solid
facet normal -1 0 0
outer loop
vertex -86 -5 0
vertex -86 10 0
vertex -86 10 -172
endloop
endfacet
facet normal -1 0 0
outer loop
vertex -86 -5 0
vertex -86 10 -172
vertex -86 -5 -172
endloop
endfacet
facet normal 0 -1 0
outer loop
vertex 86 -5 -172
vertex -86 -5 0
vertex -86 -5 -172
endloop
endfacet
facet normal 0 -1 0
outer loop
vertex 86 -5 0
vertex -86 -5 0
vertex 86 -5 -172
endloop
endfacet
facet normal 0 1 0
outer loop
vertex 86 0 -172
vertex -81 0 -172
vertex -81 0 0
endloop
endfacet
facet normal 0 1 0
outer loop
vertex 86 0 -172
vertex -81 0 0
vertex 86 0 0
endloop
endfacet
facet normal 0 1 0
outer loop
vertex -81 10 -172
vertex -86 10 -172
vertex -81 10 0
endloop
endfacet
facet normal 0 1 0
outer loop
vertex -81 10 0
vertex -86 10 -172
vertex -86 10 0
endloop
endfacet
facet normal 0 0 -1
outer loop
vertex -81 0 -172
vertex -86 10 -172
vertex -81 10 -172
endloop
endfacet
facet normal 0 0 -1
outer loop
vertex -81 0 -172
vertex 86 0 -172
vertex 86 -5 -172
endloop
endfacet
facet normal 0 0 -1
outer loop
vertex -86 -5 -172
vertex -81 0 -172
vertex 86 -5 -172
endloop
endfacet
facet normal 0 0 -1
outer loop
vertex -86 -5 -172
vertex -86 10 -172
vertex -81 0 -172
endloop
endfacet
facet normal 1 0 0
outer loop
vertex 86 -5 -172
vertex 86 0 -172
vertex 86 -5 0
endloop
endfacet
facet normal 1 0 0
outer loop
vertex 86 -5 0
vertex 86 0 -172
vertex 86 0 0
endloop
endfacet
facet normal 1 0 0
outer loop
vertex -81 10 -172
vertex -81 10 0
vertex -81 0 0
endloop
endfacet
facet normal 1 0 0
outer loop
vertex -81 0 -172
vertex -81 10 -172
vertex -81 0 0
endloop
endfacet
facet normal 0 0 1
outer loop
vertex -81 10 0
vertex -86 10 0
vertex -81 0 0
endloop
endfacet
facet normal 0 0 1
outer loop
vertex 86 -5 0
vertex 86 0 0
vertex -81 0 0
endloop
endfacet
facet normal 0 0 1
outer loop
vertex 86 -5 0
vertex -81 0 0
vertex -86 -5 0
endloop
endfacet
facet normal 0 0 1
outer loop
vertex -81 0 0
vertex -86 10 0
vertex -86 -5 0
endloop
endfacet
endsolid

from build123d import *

# Parameters (mm, degrees)
F0_W     = 172
F0_H     = 172
F1_DEPTH = 5
F2_W     = 15
F2_H     = 172
F3_DEPTH = 5


with BuildPart() as f1:
    # F0 (on Front) → F1 (new body)
    with BuildSketch(Plane.XZ):
        with Locations((0, -86)):
            Rectangle(F0_W, F0_H)
    extrude(amount=F1_DEPTH)

    # F2 (on face) → F3 (join)
    with BuildSketch(Plane(origin=(-86, 0, 0), x_dir=(0, -1, 0), z_dir=(-1, 0, 0))):
        with Locations((-2.5, -86)):
            Rectangle(F2_W, F2_H)
    extrude(amount=-F3_DEPTH)


solid = f1.part
